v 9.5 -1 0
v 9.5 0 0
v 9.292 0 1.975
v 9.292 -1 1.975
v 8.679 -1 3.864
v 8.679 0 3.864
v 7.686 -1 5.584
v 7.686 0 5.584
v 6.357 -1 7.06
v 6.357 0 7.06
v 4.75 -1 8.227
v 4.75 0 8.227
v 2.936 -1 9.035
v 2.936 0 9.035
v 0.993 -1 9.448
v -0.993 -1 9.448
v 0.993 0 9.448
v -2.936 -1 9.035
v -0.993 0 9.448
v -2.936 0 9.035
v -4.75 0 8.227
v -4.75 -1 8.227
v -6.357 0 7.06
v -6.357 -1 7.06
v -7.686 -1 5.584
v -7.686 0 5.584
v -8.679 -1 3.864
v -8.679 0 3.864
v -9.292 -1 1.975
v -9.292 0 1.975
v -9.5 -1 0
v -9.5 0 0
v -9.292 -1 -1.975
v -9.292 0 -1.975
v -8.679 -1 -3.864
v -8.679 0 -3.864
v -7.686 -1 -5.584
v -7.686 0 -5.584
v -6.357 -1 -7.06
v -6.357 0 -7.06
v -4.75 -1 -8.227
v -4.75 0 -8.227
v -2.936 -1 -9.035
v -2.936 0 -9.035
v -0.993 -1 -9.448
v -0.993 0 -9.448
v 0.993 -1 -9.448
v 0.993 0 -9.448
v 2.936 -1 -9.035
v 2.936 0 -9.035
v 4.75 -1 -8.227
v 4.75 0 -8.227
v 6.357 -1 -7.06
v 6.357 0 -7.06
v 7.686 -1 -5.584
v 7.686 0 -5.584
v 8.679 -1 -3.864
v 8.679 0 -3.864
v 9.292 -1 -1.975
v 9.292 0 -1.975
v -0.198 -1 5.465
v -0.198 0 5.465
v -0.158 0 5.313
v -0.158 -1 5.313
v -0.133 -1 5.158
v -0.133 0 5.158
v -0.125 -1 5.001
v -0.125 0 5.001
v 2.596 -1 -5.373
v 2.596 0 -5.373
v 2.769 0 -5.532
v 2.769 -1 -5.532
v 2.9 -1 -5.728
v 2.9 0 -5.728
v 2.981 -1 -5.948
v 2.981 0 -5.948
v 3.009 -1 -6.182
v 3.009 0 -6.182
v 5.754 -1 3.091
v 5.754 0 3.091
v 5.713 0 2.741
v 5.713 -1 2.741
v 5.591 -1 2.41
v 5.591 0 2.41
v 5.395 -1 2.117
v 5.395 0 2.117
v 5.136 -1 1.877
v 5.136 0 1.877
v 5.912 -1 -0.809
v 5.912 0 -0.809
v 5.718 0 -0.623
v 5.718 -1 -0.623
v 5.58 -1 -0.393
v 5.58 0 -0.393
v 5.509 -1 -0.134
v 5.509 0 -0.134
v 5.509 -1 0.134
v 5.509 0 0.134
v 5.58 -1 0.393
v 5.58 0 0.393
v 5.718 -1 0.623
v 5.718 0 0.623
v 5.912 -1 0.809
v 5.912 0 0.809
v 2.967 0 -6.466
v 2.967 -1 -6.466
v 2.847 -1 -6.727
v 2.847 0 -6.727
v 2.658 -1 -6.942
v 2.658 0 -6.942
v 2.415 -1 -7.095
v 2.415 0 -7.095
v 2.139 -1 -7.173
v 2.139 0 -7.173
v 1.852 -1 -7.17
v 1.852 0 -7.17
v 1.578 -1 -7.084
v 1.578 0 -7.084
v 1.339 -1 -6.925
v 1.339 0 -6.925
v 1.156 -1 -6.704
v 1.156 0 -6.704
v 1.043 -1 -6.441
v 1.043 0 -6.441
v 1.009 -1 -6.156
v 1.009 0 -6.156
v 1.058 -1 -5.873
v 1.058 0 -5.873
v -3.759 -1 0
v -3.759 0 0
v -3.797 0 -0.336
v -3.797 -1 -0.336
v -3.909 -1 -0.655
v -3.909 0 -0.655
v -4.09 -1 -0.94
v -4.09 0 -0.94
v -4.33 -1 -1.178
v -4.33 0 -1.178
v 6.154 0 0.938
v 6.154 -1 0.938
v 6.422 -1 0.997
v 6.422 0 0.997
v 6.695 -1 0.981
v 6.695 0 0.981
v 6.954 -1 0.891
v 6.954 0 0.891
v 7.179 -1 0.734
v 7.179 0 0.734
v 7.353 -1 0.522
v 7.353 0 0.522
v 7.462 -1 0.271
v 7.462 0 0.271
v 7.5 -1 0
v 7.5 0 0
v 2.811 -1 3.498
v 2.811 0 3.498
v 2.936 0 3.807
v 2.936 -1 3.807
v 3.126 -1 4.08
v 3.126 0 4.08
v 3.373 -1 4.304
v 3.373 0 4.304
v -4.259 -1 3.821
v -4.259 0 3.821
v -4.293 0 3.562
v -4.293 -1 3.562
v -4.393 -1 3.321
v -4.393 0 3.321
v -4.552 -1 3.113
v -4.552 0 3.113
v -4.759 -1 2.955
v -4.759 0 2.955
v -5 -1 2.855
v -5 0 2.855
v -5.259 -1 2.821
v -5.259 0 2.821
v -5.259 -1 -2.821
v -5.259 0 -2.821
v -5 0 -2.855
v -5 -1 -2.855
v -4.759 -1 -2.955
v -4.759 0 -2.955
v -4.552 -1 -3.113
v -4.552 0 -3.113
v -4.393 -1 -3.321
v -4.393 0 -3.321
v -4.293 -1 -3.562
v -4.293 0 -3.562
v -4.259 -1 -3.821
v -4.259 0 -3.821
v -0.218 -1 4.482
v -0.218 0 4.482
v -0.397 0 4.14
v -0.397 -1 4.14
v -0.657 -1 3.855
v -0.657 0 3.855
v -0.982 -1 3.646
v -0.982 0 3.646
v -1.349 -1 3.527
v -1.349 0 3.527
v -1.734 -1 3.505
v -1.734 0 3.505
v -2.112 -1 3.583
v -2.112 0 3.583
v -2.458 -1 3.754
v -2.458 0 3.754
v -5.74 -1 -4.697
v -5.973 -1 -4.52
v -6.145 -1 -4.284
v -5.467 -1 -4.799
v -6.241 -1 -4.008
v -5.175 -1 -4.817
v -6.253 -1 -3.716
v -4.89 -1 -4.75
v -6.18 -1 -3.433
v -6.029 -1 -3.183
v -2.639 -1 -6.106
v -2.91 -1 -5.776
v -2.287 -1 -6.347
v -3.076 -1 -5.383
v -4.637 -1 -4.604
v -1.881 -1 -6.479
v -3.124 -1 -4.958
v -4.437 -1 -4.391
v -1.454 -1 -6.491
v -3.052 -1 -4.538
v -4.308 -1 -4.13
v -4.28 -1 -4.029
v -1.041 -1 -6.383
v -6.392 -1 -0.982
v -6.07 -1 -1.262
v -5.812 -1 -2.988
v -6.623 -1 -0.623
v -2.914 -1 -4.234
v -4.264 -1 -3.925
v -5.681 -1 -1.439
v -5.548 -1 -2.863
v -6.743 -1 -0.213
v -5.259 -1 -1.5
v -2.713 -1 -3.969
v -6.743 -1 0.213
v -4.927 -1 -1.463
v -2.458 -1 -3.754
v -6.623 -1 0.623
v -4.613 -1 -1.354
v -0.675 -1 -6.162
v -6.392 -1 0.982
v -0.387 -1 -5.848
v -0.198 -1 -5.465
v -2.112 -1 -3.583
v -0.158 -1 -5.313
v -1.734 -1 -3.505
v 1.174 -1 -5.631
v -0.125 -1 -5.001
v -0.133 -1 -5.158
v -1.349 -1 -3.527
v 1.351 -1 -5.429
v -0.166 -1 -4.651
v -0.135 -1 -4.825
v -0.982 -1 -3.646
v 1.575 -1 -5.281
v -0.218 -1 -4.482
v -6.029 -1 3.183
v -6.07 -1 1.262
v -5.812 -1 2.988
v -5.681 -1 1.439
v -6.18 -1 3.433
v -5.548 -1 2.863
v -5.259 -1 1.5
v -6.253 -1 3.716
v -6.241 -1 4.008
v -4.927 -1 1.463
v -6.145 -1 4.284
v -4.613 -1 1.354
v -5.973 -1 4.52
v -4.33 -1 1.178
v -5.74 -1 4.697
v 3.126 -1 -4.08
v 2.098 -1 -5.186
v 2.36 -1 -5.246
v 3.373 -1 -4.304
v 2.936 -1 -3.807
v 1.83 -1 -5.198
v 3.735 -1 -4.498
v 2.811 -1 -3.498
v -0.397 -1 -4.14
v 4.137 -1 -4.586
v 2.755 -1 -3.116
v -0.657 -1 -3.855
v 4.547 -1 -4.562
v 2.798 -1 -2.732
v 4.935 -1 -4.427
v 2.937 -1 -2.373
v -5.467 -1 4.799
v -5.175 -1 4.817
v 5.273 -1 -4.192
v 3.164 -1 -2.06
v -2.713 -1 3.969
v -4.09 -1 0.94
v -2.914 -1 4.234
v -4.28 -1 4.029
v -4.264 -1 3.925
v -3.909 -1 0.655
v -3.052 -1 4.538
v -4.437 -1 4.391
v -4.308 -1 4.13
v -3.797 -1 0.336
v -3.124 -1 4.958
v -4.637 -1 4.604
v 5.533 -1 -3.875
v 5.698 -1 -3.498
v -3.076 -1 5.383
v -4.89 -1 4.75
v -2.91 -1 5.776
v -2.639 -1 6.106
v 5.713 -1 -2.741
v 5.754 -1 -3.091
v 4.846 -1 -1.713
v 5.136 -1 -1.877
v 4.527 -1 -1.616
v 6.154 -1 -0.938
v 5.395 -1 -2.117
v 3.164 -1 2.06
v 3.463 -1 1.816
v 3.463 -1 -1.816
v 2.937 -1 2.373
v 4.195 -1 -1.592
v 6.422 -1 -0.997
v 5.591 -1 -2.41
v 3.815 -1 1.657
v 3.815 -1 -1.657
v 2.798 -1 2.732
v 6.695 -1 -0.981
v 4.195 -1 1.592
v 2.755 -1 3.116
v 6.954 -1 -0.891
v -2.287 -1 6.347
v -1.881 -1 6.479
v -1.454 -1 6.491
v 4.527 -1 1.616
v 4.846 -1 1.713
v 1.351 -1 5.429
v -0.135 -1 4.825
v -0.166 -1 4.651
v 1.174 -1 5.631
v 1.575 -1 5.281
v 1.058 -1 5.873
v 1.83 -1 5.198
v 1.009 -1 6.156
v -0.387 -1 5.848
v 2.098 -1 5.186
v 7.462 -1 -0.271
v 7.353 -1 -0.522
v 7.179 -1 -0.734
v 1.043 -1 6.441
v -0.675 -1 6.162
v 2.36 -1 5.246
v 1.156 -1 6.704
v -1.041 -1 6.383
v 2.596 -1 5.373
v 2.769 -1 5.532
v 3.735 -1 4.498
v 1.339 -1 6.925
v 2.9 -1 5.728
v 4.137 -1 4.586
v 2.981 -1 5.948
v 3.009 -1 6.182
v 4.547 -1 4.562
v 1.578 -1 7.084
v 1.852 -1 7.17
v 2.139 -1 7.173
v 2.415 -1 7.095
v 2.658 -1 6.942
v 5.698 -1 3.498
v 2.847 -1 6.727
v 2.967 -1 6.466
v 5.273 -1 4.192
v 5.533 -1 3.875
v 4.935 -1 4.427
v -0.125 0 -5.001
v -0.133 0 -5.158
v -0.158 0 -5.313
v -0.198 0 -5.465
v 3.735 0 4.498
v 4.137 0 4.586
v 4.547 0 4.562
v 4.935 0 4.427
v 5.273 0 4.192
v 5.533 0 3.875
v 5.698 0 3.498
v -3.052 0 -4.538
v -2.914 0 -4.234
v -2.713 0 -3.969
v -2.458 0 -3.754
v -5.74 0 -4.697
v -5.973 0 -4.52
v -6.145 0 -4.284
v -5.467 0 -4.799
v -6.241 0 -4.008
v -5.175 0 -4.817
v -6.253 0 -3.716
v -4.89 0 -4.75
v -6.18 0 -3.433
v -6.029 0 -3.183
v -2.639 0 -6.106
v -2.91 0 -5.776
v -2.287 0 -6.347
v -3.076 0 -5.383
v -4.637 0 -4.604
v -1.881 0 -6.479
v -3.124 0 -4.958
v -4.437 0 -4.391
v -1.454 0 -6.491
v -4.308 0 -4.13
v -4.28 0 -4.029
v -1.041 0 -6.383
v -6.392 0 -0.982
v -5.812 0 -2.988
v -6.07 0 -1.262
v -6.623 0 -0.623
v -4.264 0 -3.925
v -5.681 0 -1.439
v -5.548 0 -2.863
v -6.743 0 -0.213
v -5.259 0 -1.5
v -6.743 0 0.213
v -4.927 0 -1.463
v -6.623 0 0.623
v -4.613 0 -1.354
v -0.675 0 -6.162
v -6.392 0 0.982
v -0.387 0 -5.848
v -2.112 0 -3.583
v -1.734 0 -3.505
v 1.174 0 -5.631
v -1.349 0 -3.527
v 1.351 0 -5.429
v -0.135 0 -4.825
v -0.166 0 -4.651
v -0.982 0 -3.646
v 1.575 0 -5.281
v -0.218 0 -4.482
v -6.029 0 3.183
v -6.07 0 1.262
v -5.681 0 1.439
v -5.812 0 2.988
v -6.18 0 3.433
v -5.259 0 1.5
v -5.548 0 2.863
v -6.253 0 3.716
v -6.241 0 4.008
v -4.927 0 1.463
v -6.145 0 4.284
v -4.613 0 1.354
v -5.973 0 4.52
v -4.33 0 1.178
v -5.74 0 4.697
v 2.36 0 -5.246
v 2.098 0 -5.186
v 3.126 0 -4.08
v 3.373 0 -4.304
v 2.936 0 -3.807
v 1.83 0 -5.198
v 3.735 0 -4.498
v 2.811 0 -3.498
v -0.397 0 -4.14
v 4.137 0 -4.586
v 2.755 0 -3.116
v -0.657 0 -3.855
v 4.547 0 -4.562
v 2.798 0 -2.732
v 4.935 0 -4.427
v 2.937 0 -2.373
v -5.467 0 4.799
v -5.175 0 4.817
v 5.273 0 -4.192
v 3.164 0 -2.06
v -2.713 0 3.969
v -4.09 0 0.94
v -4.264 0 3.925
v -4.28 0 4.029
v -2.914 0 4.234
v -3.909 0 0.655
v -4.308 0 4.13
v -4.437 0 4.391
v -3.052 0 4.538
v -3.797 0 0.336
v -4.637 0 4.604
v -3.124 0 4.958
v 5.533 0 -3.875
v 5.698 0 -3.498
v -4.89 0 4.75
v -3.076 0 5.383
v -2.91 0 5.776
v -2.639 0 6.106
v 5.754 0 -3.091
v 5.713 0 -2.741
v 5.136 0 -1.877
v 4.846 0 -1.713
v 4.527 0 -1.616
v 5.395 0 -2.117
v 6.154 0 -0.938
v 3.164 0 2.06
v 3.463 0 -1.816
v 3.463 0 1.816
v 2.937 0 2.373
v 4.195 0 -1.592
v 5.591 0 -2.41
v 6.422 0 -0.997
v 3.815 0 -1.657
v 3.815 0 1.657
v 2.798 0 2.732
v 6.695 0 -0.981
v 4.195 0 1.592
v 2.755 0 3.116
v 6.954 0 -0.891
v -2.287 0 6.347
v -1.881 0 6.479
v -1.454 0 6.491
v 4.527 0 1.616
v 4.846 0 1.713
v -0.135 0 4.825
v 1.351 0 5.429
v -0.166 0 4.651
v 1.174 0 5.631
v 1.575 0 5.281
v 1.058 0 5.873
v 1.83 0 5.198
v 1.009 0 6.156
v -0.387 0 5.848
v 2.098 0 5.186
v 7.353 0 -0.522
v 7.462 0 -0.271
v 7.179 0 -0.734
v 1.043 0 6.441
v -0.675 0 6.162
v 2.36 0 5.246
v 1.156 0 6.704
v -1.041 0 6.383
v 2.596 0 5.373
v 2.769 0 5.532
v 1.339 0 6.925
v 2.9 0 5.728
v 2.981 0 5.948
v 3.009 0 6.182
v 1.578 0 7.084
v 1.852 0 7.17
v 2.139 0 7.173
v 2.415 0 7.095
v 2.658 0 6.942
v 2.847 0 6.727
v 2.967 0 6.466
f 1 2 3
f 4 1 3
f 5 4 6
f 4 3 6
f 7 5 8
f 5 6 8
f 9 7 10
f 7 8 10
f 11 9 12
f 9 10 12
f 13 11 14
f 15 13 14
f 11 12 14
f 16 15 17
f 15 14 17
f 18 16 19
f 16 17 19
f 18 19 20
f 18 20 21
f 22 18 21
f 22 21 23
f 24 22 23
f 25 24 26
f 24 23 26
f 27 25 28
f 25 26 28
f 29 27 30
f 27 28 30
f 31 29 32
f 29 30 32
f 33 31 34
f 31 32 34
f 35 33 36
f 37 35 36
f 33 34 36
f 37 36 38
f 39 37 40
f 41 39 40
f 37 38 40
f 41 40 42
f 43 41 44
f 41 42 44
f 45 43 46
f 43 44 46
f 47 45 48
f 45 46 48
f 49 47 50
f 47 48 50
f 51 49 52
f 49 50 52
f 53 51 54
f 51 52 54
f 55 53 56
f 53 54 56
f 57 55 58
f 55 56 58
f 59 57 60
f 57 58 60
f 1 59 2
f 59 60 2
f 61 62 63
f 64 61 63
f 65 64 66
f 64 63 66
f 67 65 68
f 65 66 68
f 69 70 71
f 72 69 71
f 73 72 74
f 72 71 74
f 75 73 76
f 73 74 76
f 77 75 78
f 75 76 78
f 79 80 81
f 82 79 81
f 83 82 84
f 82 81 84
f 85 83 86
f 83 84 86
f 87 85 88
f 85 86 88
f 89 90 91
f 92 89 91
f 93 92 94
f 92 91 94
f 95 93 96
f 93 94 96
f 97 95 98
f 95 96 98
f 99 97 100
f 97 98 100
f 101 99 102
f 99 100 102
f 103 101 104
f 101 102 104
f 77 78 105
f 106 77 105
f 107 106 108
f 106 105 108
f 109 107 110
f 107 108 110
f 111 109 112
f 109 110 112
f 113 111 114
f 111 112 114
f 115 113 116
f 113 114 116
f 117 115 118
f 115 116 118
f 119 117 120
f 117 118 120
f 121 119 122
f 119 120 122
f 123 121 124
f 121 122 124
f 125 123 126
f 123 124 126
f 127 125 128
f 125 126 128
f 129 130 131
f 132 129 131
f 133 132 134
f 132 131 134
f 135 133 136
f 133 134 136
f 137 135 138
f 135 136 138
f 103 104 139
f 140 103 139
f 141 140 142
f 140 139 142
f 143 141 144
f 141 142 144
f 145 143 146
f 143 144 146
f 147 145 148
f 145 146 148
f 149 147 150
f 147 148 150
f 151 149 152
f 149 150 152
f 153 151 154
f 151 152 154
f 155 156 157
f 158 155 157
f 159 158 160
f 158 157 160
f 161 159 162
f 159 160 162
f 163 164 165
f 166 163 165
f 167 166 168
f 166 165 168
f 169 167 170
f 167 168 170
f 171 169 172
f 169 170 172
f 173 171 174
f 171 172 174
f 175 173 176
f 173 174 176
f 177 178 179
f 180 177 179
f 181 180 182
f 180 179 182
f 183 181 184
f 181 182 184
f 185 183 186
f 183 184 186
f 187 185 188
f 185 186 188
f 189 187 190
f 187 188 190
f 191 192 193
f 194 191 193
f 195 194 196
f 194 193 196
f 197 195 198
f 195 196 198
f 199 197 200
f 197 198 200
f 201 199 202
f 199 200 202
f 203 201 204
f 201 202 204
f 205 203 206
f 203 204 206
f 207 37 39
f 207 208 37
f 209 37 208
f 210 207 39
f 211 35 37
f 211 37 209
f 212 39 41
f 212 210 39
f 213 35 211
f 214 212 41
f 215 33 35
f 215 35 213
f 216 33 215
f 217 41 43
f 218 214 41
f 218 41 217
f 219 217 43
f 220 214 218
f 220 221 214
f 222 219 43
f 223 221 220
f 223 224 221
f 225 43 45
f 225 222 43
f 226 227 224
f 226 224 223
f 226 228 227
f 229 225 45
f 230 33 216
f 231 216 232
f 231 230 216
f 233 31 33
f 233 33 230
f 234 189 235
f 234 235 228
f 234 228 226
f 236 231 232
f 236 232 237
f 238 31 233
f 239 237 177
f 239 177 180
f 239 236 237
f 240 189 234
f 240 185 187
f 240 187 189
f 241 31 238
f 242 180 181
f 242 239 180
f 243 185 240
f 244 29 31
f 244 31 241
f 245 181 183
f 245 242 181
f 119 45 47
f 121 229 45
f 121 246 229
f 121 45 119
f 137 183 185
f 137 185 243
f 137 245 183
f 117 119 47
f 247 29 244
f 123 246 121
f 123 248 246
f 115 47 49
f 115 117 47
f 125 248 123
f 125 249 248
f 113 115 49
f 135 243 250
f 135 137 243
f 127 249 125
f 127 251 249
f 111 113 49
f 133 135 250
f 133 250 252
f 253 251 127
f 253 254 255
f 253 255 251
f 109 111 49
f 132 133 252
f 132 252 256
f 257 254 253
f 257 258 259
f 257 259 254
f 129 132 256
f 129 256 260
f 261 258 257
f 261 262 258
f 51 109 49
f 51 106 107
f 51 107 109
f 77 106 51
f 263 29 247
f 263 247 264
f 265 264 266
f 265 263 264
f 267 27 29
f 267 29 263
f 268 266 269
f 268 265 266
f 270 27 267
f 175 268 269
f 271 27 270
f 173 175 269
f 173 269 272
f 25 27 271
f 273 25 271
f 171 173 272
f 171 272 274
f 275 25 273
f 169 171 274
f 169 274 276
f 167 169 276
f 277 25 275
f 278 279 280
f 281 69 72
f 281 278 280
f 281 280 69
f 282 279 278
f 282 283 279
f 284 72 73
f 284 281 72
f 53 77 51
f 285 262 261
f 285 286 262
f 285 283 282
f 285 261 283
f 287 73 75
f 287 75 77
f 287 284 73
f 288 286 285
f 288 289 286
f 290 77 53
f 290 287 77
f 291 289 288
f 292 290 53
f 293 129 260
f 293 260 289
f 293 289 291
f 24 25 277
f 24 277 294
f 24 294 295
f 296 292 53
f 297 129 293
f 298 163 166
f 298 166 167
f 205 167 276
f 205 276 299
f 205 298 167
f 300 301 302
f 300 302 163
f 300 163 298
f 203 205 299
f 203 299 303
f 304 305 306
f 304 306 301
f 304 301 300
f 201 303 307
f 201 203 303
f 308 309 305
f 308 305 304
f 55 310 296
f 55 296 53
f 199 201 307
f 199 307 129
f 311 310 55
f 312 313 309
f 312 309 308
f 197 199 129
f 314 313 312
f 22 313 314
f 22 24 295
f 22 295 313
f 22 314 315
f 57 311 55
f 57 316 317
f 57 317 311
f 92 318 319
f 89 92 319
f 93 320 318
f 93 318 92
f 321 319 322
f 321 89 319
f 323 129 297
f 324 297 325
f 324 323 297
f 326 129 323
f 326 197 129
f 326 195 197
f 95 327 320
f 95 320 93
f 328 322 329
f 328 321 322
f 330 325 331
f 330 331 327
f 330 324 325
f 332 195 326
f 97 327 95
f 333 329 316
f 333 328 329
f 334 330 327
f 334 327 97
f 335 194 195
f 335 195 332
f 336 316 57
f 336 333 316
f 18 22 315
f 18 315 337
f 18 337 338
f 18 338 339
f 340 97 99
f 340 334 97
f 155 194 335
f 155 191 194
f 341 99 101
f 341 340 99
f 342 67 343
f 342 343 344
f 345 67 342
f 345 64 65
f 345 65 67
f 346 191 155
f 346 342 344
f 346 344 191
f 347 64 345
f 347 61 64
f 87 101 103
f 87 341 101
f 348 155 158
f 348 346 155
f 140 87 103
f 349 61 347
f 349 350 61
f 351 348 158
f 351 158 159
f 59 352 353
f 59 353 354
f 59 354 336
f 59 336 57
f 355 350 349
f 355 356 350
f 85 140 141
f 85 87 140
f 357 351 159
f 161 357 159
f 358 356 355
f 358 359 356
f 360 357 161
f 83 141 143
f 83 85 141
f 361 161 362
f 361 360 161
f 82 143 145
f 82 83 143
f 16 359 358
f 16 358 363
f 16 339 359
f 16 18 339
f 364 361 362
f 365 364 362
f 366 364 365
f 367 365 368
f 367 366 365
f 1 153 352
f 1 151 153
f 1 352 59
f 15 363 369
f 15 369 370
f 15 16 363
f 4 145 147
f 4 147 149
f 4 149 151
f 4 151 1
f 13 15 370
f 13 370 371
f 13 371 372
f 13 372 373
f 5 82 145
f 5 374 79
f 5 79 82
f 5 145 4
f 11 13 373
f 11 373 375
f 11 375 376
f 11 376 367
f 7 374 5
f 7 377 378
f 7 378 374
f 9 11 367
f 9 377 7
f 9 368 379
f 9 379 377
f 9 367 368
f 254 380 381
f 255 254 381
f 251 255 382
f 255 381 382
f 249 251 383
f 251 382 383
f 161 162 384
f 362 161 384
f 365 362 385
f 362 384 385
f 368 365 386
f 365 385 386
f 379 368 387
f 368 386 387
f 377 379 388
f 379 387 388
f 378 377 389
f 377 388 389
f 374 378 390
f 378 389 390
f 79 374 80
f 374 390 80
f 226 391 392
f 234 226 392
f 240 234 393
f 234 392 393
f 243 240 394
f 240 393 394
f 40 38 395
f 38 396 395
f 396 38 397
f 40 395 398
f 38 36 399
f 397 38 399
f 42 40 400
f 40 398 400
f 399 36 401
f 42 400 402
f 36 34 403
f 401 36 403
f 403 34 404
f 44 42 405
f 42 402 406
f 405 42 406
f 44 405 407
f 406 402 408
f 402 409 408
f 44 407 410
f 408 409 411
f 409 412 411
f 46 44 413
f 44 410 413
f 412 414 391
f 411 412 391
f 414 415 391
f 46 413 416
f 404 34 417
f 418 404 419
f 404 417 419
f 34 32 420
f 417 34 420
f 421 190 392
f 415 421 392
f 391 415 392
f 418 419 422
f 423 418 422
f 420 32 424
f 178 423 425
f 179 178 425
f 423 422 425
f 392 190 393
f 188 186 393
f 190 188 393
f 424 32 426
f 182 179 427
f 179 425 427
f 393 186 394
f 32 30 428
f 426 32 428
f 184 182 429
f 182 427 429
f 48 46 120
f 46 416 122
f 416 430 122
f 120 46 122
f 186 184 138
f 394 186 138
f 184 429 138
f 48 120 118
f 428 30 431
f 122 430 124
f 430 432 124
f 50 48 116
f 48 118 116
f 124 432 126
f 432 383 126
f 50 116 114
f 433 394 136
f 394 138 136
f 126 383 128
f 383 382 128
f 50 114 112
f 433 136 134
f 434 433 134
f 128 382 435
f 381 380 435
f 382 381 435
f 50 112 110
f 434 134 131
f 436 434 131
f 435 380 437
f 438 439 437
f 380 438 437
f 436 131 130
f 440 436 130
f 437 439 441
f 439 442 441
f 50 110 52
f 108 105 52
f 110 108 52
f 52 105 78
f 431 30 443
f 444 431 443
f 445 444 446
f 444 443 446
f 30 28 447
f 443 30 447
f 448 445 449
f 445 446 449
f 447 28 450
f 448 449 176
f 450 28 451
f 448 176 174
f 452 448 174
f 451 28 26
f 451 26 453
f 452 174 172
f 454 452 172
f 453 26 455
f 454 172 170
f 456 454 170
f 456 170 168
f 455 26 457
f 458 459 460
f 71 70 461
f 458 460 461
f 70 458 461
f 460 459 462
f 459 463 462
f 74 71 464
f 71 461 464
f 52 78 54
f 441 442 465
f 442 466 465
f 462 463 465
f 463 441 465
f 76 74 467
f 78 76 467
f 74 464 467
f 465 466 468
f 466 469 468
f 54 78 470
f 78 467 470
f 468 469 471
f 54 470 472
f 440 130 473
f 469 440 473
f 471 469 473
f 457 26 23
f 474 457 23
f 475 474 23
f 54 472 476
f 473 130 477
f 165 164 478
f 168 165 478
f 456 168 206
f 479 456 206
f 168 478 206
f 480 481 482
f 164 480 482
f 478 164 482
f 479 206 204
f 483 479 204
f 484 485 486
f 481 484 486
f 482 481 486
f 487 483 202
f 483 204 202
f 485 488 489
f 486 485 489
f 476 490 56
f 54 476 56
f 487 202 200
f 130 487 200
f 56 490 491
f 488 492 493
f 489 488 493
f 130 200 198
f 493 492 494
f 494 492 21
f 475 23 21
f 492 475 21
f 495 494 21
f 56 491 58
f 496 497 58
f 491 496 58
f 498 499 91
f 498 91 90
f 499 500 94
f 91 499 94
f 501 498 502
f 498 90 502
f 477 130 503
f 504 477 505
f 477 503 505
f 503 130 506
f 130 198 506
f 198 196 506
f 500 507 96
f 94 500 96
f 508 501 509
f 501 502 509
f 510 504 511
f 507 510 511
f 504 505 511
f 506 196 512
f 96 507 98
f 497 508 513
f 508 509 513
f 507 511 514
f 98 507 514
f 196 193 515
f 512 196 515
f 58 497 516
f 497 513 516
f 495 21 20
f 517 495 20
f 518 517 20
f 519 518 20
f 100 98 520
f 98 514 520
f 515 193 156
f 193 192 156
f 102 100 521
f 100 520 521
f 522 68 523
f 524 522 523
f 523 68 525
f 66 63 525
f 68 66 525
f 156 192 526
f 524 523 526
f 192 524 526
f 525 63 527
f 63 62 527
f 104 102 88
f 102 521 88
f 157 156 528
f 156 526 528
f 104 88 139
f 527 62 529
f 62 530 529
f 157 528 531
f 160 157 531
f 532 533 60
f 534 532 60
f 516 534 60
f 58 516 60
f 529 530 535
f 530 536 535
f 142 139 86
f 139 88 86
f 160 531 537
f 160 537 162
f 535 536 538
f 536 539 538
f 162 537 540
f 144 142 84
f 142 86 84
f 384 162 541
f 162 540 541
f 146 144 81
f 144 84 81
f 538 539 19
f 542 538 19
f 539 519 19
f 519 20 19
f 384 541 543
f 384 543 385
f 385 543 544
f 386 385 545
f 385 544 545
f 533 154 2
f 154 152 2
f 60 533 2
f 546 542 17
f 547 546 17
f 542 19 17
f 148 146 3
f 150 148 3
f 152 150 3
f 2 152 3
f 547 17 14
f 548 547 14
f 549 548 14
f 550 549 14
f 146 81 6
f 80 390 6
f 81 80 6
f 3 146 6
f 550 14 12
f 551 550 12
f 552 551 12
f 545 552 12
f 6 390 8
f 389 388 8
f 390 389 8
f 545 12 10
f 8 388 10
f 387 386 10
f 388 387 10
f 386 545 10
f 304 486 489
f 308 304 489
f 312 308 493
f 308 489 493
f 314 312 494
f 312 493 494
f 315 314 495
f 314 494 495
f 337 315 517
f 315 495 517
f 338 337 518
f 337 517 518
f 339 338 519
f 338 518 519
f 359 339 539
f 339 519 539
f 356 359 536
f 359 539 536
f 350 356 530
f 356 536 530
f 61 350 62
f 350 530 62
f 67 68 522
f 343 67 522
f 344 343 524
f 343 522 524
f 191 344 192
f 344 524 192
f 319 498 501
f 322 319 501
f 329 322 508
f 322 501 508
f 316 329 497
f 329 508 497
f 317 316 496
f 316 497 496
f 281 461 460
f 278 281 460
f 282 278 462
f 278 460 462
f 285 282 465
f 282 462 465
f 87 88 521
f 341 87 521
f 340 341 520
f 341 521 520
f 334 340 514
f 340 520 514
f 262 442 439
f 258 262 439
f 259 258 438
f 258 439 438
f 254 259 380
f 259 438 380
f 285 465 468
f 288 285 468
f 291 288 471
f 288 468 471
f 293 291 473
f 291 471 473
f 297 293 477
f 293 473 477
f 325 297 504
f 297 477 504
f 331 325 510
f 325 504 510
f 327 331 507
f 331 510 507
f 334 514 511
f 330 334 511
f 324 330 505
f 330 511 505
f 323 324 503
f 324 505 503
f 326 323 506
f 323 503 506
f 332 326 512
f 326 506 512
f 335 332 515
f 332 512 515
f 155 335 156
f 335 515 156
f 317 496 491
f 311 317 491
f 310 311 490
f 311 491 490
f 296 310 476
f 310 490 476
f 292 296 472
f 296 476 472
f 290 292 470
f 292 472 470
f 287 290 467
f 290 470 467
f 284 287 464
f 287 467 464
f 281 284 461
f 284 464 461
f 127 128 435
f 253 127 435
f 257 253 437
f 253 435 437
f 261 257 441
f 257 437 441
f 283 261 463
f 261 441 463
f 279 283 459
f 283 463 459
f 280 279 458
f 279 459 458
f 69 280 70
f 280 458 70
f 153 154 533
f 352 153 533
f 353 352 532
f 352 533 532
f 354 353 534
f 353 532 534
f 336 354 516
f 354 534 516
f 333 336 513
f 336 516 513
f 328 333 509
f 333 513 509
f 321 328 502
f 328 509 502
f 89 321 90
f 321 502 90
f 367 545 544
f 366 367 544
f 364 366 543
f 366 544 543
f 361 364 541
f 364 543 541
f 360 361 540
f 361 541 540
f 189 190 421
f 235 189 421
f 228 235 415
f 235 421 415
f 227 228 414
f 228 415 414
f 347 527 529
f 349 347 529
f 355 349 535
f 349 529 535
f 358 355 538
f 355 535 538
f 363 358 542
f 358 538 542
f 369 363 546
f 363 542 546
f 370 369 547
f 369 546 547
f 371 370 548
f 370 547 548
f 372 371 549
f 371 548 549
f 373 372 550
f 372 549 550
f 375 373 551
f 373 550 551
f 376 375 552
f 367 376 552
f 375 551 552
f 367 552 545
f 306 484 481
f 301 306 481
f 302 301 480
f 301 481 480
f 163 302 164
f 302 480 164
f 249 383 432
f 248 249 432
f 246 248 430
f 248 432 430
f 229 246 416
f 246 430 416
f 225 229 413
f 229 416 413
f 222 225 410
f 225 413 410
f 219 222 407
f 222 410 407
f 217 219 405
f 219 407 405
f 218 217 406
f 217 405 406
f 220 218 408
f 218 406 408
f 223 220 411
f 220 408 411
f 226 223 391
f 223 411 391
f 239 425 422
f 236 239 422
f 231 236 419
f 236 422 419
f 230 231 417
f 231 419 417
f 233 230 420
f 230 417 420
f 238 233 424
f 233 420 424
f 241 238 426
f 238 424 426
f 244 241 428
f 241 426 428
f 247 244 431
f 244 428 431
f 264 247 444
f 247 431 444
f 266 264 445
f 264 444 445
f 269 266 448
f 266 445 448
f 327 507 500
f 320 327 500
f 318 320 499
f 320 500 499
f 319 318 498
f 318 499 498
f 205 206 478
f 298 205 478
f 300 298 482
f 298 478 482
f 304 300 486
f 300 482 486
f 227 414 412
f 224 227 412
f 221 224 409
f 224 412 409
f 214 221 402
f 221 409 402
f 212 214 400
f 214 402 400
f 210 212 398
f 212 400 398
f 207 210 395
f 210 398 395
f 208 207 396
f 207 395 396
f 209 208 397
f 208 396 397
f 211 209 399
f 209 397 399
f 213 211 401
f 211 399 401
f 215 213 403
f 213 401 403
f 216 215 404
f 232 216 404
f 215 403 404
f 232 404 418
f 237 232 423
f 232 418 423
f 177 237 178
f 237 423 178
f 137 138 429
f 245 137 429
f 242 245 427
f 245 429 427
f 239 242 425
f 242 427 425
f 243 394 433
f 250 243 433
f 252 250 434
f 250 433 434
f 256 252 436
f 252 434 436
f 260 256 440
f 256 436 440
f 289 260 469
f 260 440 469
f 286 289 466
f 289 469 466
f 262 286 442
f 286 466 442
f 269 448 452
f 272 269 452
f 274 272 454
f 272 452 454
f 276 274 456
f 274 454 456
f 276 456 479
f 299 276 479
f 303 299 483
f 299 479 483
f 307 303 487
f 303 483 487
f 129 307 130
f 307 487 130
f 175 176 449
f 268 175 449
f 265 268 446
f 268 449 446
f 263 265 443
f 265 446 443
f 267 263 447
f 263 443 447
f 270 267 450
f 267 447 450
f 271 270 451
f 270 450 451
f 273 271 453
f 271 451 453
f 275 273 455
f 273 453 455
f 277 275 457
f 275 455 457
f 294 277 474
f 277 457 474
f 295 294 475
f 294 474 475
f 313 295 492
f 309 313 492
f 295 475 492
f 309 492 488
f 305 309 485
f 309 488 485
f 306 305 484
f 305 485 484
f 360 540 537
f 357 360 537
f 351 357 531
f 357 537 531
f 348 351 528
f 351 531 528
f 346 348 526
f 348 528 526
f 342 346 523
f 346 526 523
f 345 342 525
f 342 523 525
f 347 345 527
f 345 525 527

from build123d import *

# Parameters (mm, degrees)
F0_R     = 9.5
F1_DEPTH = 1


# Not quite as in the source:
# - a feature names something its author has since deleted; it is built from what else it names


with BuildPart() as f1:
    # F0 (on Front) → F1 (new body)
    with BuildSketch(Plane.XZ):
        Circle(F0_R)
        with BuildLine():
            Line((-6.1874431518, -2.6427799437), (-5.2586104634, -1.91030207))
            Line((-5.2586104634, -1.91030207), (-5.2586104634, -1.5))
            ThreePointArc((-5.2586104634, -1.5), (-6.7586104634, 0), (-5.2586104634, 1.5))
            Line((-5.2586104634, 1.5), (-5.2586104634, 1.91030207))
            Line((-5.2586104634, 1.91030207), (-6.1874431518, 2.6427799437))
            ThreePointArc((-6.1874431518, 2.6427799437), (-6.472135955, 4.7022820183), (-4.4254581722, 5.0679442137))
            Line((-4.4254581722, 5.0679442137), (-3.4418052317, 4.4109199439))
            Line((-3.4418052317, 4.4109199439), (-3.0515847744, 4.5377102563))
            ThreePointArc((-3.0515847744, 4.5377102563), (-2.0885254916, 6.4278205224), (-0.1984152256, 5.4647612395))
            Line((-0.1984152256, 5.4647612395), (0.1918052317, 5.5915515519))
            Line((0.1918052317, 5.5915515519), (0.601408001, 6.7012720437))
            ThreePointArc((0.601408001, 6.7012720437), (2.2724250824, 7.6584857382), (3.5086104634, 6.1818673559))
            ThreePointArc((3.5086104634, 6.1818673559), (3.4944811986, 5.976469794), (3.4523595855, 5.7749417209))
            Line((3.4523595855, 5.7749417209), (3.1314578476, 4.6364005169))
            Line((3.1314578476, 4.6364005169), (3.3726273533, 4.3044591695))
            ThreePointArc((3.3726273533, 4.3044591695), (4.9352909813, 4.4274434642), (5.7543052317, 3.090933678))
            ThreePointArc((5.7543052317, 3.090933678), (5.590815018, 2.4099479283), (5.1359831102, 1.8774081864))
            Line((5.1359831102, 1.8774081864), (5.3771526159, 1.545466839))
            Line((5.3771526159, 1.545466839), (6.5591337375, 1.4988339471))
            ThreePointArc((6.5591337375, 1.4988339471), (7.5813650184, 1.0395430231), (8, 0))
            ThreePointArc((8, 0), (7.5813650184, -1.0395430231), (6.5591337375, -1.4988339471))
            Line((6.5591337375, -1.4988339471), (5.3771526159, -1.545466839))
            Line((5.3771526159, -1.545466839), (5.1359831102, -1.8774081864))
            ThreePointArc((5.1359831102, -1.8774081864), (5.590815018, -2.4099479283), (5.7543052317, -3.090933678))
            ThreePointArc((5.7543052317, -3.090933678), (4.9352909813, -4.4274434642), (3.3726273533, -4.3044591695))
            Line((3.3726273533, -4.3044591695), (3.1314578476, -4.6364005169))
            Line((3.1314578476, -4.6364005169), (3.4523595855, -5.7749417209))
            ThreePointArc((3.4523595855, -5.7749417209), (3.4944811986, -5.976469794), (3.5086104634, -6.1818673559))
            ThreePointArc((3.5086104634, -6.1818673559), (2.2724250824, -7.6584857382), (0.601408001, -6.7012720437))
            Line((0.601408001, -6.7012720437), (0.1918052317, -5.5915515519))
            Line((0.1918052317, -5.5915515519), (-0.1984152256, -5.4647612395))
            ThreePointArc((-0.1984152256, -5.4647612395), (-2.0885254916, -6.4278205224), (-3.0515847744, -4.5377102563))
            Line((-3.0515847744, -4.5377102563), (-3.4418052317, -4.4109199439))
            Line((-3.4418052317, -4.4109199439), (-4.4254581722, -5.0679442137))
            ThreePointArc((-4.4254581722, -5.0679442137), (-6.472135955, -4.7022820183), (-6.1874431518, -2.6427799437))
        make_face(mode=Mode.SUBTRACT)
        with BuildLine():
            Line((-5.2586104634, -1.91030207), (-5.2586104634, -2.3206041399))
            ThreePointArc((-5.2586104634, -2.3206041399), (-4.1979502917, -2.7599439681), (-3.7586104634, -3.8206041399))
            ThreePointArc((-3.7586104634, -3.8206041399), (-3.7770779525, -4.0552558375), (-3.832025689, -4.2841296315))
            Line((-3.832025689, -4.2841296315), (-3.4418052317, -4.4109199439))
            Line((-3.4418052317, -4.4109199439), (-2.4581522912, -3.7538956741))
            ThreePointArc((-2.4581522912, -3.7538956741), (-1.1614745084, -3.5746509735), (-0.2177975376, -4.4818310601))
            Line((-0.2177975376, -4.4818310601), (0.1918052317, -5.5915515519))
            Line((0.1918052317, -5.5915515519), (0.582025689, -5.7183418644))
            ThreePointArc((0.582025689, -5.7183418644), (1.5450849719, -4.7552825815), (2.8902883419, -4.9683418644))
            Line((2.8902883419, -4.9683418644), (3.1314578476, -4.6364005169))
            Line((3.1314578476, -4.6364005169), (2.8105561096, -3.497859313))
            ThreePointArc((2.8105561096, -3.497859313), (3.0407797402, -2.2092557995), (4.1951714942, -1.5920997308))
            Line((4.1951714942, -1.5920997308), (5.3771526159, -1.545466839))
            Line((5.3771526159, -1.545466839), (5.6183221216, -1.2135254916))
            ThreePointArc((5.6183221216, -1.2135254916), (5, 0), (5.6183221216, 1.2135254916))
            Line((5.6183221216, 1.2135254916), (5.3771526159, 1.545466839))
            Line((5.3771526159, 1.545466839), (4.1951714942, 1.5920997308))
            ThreePointArc((4.1951714942, 1.5920997308), (3.0407797402, 2.2092557995), (2.8105561096, 3.497859313))
            Line((2.8105561096, 3.497859313), (3.1314578476, 4.6364005169))
            Line((3.1314578476, 4.6364005169), (2.8902883419, 4.9683418644))
            ThreePointArc((2.8902883419, 4.9683418644), (1.5450849719, 4.7552825815), (0.582025689, 5.7183418644))
            Line((0.582025689, 5.7183418644), (0.1918052317, 5.5915515519))
            Line((0.1918052317, 5.5915515519), (-0.2177975376, 4.4818310601))
            ThreePointArc((-0.2177975376, 4.4818310601), (-1.1614745084, 3.5746509735), (-2.4581522912, 3.7538956741))
            Line((-2.4581522912, 3.7538956741), (-3.4418052317, 4.4109199439))
            Line((-3.4418052317, 4.4109199439), (-3.832025689, 4.2841296315))
            ThreePointArc((-3.832025689, 4.2841296315), (-3.7770779525, 4.0552558375), (-3.7586104634, 3.8206041399))
            ThreePointArc((-3.7586104634, 3.8206041399), (-4.1979502917, 2.7599439681), (-5.2586104634, 2.3206041399))
            Line((-5.2586104634, 2.3206041399), (-5.2586104634, 1.91030207))
            Line((-5.2586104634, 1.91030207), (-4.3297777751, 1.1778241962))
            ThreePointArc((-4.3297777751, 1.1778241962), (-3.9089347556, 0.6545039983), (-3.7586104634, 0))
            ThreePointArc((-3.7586104634, 0), (-3.9089347556, -0.6545039983), (-4.3297777751, -1.1778241962))
            Line((-4.3297777751, -1.1778241962), (-5.2586104634, -1.91030207))
        make_face()
        with BuildLine():
            ThreePointArc((1.5, 2), (2.2360679775, 1.1180339887), (2.5, 0))
            ThreePointArc((2.5, 0), (2.2360679775, -1.1180339887), (1.5, -2))
            ThreePointArc((1.5, -2), (-2.5, 0), (1.5, 2))
        make_face(mode=Mode.SUBTRACT)
        with BuildLine():
            Line((1.5, -2), (1.5, 2))
            ThreePointArc((1.5, 2), (-2.5, 0), (1.5, -2))
        make_face()
        with BuildLine():
            ThreePointArc((1.5, -2), (2.2360679775, -1.1180339887), (2.5, 0))
            ThreePointArc((2.5, 0), (2.2360679775, 1.1180339887), (1.5, 2))
            Line((1.5, 2), (1.5, -2))
        make_face()
        with BuildLine():
            ThreePointArc((-4.3075539471, -4.1296211343), (-6.0676274578, -4.4083893922), (-5.2586104634, -2.8206041399))
            Line((-5.2586104634, -2.8206041399), (-5.2586104634, -2.3206041399))
            ThreePointArc((-5.2586104634, -2.3206041399), (-5.7501710933, -2.403435079), (-6.1874431518, -2.6427799437))
            ThreePointArc((-6.1874431518, -2.6427799437), (-6.472135955, -4.7022820183), (-4.4254581722, -5.0679442137))
            ThreePointArc((-4.4254581722, -5.0679442137), (-4.0627031818, -4.7260354038), (-3.832025689, -4.2841296315))
            Line((-3.832025689, -4.2841296315), (-4.3075539471, -4.1296211343))
        make_face()
        with BuildLine():
            ThreePointArc((-6.1874431518, 2.6427799437), (-5.7501710933, 2.403435079), (-5.2586104634, 2.3206041399))
            Line((-5.2586104634, 2.3206041399), (-5.2586104634, 2.8206041399))
            ThreePointArc((-5.2586104634, 2.8206041399), (-6.0676274578, 4.4083893922), (-4.3075539471, 4.1296211343))
            Line((-4.3075539471, 4.1296211343), (-3.832025689, 4.2841296315))
            ThreePointArc((-3.832025689, 4.2841296315), (-4.0627031818, 4.7260354038), (-4.4254581722, 5.0679442137))
            ThreePointArc((-4.4254581722, 5.0679442137), (-6.472135955, 4.7022820183), (-6.1874431518, 2.6427799437))
        make_face()
        with BuildLine():
            Line((1.0575539471, -5.8728503615), (0.582025689, -5.7183418644))
            ThreePointArc((0.582025689, -5.7183418644), (0.508902005, -6.2114399724), (0.601408001, -6.7012720437))
            ThreePointArc((0.601408001, -6.7012720437), (2.2724250824, -7.6584857382), (3.5086104634, -6.1818673559))
            ThreePointArc((3.5086104634, -6.1818673559), (3.4944811986, -5.976469794), (3.4523595855, -5.7749417209))
            ThreePointArc((3.4523595855, -5.7749417209), (3.2392824408, -5.3242855906), (2.8902883419, -4.9683418644))
            Line((2.8902883419, -4.9683418644), (2.5963957157, -5.3728503615))
            ThreePointArc((2.5963957157, -5.3728503615), (2.8996169876, -5.7278768562), (3.0086104634, -6.1818673559))
            ThreePointArc((3.0086104634, -6.1818673559), (1.8521759984, -7.1695556965), (1.0575539471, -5.8728503615))
        make_face()
        with BuildLine():
            ThreePointArc((0.601408001, 6.7012720437), (0.508902005, 6.2114399724), (0.582025689, 5.7183418644))
            Line((0.582025689, 5.7183418644), (1.0575539471, 5.8728503615))
            ThreePointArc((1.0575539471, 5.8728503615), (1.8521759984, 7.1695556965), (3.0086104634, 6.1818673559))
            ThreePointArc((3.0086104634, 6.1818673559), (2.8996169876, 5.7278768562), (2.5963957157, 5.3728503615))
            Line((2.5963957157, 5.3728503615), (2.8902883419, 4.9683418644))
            ThreePointArc((2.8902883419, 4.9683418644), (3.2392824408, 5.3242855906), (3.4523595855, 5.7749417209))
            ThreePointArc((3.4523595855, 5.7749417209), (3.4944811986, 5.976469794), (3.5086104634, 6.1818673559))
            ThreePointArc((3.5086104634, 6.1818673559), (2.2724250824, 7.6584857382), (0.601408001, 6.7012720437))
        make_face()
        with BuildLine():
            Line((5.9122147477, -0.8090169944), (5.6183221216, -1.2135254916))
            ThreePointArc((5.6183221216, -1.2135254916), (6.0646898294, -1.435445943), (6.5591337375, -1.4988339471))
            ThreePointArc((6.5591337375, -1.4988339471), (7.5813650184, -1.0395430231), (8, 0))
            ThreePointArc((8, 0), (7.5813650184, 1.0395430231), (6.5591337375, 1.4988339471))
            ThreePointArc((6.5591337375, 1.4988339471), (6.0646898294, 1.435445943), (5.6183221216, 1.2135254916))
            Line((5.6183221216, 1.2135254916), (5.9122147477, 0.8090169944))
            ThreePointArc((5.9122147477, 0.8090169944), (6.9539904997, 0.8910065242), (7.5, 0))
            ThreePointArc((7.5, 0), (6.9539904997, -0.8910065242), (5.9122147477, -0.8090169944))
        make_face()
        with BuildLine():
            Line((-5.2586104634, -2.3206041399), (-5.2586104634, -2.8206041399))
            ThreePointArc((-5.2586104634, -2.8206041399), (-4.5515036823, -3.1134973587), (-4.2586104634, -3.8206041399))
            ThreePointArc((-4.2586104634, -3.8206041399), (-4.2709221228, -3.9770386049), (-4.3075539471, -4.1296211343))
            Line((-4.3075539471, -4.1296211343), (-3.832025689, -4.2841296315))
            ThreePointArc((-3.832025689, -4.2841296315), (-3.7770779525, -4.0552558375), (-3.7586104634, -3.8206041399))
            ThreePointArc((-3.7586104634, -3.8206041399), (-4.1979502917, -2.7599439681), (-5.2586104634, -2.3206041399))
        make_face()
        with BuildLine():
            Line((-5.2586104634, 2.8206041399), (-5.2586104634, 2.3206041399))
            ThreePointArc((-5.2586104634, 2.3206041399), (-4.1979502917, 2.7599439681), (-3.7586104634, 3.8206041399))
            ThreePointArc((-3.7586104634, 3.8206041399), (-3.7770779525, 4.0552558375), (-3.832025689, 4.2841296315))
            Line((-3.832025689, 4.2841296315), (-4.3075539471, 4.1296211343))
            ThreePointArc((-4.3075539471, 4.1296211343), (-4.2709221228, 3.9770386049), (-4.2586104634, 3.8206041399))
            ThreePointArc((-4.2586104634, 3.8206041399), (-4.5515036823, 3.1134973587), (-5.2586104634, 2.8206041399))
        make_face()
        with BuildLine():
            ThreePointArc((2.8902883419, -4.9683418644), (1.5450849719, -4.7552825815), (0.582025689, -5.7183418644))
            Line((0.582025689, -5.7183418644), (1.0575539471, -5.8728503615))
            ThreePointArc((1.0575539471, -5.8728503615), (1.6995934691, -5.2308108396), (2.5963957157, -5.3728503615))
            Line((2.5963957157, -5.3728503615), (2.8902883419, -4.9683418644))
        make_face()
        with BuildLine():
            Line((1.0575539471, 5.8728503615), (0.582025689, 5.7183418644))
            ThreePointArc((0.582025689, 5.7183418644), (1.5450849719, 4.7552825815), (2.8902883419, 4.9683418644))
            Line((2.8902883419, 4.9683418644), (2.5963957157, 5.3728503615))
            ThreePointArc((2.5963957157, 5.3728503615), (1.6995934691, 5.2308108396), (1.0575539471, 5.8728503615))
        make_face()
        with BuildLine():
            ThreePointArc((5.6183221216, 1.2135254916), (5, 0), (5.6183221216, -1.2135254916))
            Line((5.6183221216, -1.2135254916), (5.9122147477, -0.8090169944))
            ThreePointArc((5.9122147477, -0.8090169944), (5.5, 0), (5.9122147477, 0.8090169944))
            Line((5.9122147477, 0.8090169944), (5.6183221216, 1.2135254916))
        make_face()
        with BuildLine():
            ThreePointArc((-6.1874431518, -2.6427799437), (-5.7501710933, -2.403435079), (-5.2586104634, -2.3206041399))
            Line((-5.2586104634, -2.3206041399), (-5.2586104634, -1.91030207))
            Line((-5.2586104634, -1.91030207), (-6.1874431518, -2.6427799437))
        make_face()
        with BuildLine():
            Line((-3.4418052317, -4.4109199439), (-3.832025689, -4.2841296315))
            ThreePointArc((-3.832025689, -4.2841296315), (-4.0627031818, -4.7260354038), (-4.4254581722, -5.0679442137))
            Line((-4.4254581722, -5.0679442137), (-3.4418052317, -4.4109199439))
        make_face()
        with BuildLine():
            Line((-5.2586104634, -1.5), (-5.2586104634, -1.91030207))
            Line((-5.2586104634, -1.91030207), (-4.3297777751, -1.1778241962))
            ThreePointArc((-4.3297777751, -1.1778241962), (-4.7670498335, -1.4171690609), (-5.2586104634, -1.5))
        make_face()
        with BuildLine():
            Line((-2.4581522912, -3.7538956741), (-3.4418052317, -4.4109199439))
            Line((-3.4418052317, -4.4109199439), (-3.0515847744, -4.5377102563))
            ThreePointArc((-3.0515847744, -4.5377102563), (-2.8209072816, -4.095804484), (-2.4581522912, -3.7538956741))
        make_face()
        with BuildLine():
            Line((-5.2586104634, 1.91030207), (-5.2586104634, 1.5))
            ThreePointArc((-5.2586104634, 1.5), (-4.7670498335, 1.4171690609), (-4.3297777751, 1.1778241962))
            Line((-4.3297777751, 1.1778241962), (-5.2586104634, 1.91030207))
        make_face()
        with BuildLine():
            ThreePointArc((-0.125, -5.0012357479), (-0.1434674891, -5.2358874455), (-0.1984152256, -5.4647612395))
            Line((-0.1984152256, -5.4647612395), (0.1918052317, -5.5915515519))
            Line((0.1918052317, -5.5915515519), (-0.2177975376, -4.4818310601))
            ThreePointArc((-0.2177975376, -4.4818310601), (-0.1483816177, -4.737421129), (-0.125, -5.0012357479))
        make_face()
        with BuildLine():
            Line((-6.1874431518, 2.6427799437), (-5.2586104634, 1.91030207))
            Line((-5.2586104634, 1.91030207), (-5.2586104634, 2.3206041399))
            ThreePointArc((-5.2586104634, 2.3206041399), (-5.7501710933, 2.403435079), (-6.1874431518, 2.6427799437))
        make_face()
        with BuildLine():
            Line((0.582025689, -5.7183418644), (0.1918052317, -5.5915515519))
            Line((0.1918052317, -5.5915515519), (0.601408001, -6.7012720437))
            ThreePointArc((0.601408001, -6.7012720437), (0.508902005, -6.2114399724), (0.582025689, -5.7183418644))
        make_face()
        with BuildLine():
            Line((-3.4418052317, 4.4109199439), (-4.4254581722, 5.0679442137))
            ThreePointArc((-4.4254581722, 5.0679442137), (-4.0627031818, 4.7260354038), (-3.832025689, 4.2841296315))
            Line((-3.832025689, 4.2841296315), (-3.4418052317, 4.4109199439))
        make_face()
        with BuildLine():
            Line((3.1314578476, -4.6364005169), (2.8902883419, -4.9683418644))
            ThreePointArc((2.8902883419, -4.9683418644), (3.2392824408, -5.3242855906), (3.4523595855, -5.7749417209))
            Line((3.4523595855, -5.7749417209), (3.1314578476, -4.6364005169))
        make_face()
        with BuildLine():
            Line((-3.0515847744, 4.5377102563), (-3.4418052317, 4.4109199439))
            Line((-3.4418052317, 4.4109199439), (-2.4581522912, 3.7538956741))
            ThreePointArc((-2.4581522912, 3.7538956741), (-2.8209072816, 4.095804484), (-3.0515847744, 4.5377102563))
        make_face()
        with BuildLine():
            Line((2.8105561096, -3.497859313), (3.1314578476, -4.6364005169))
            Line((3.1314578476, -4.6364005169), (3.3726273533, -4.3044591695))
            ThreePointArc((3.3726273533, -4.3044591695), (3.0236332544, -3.9485154433), (2.8105561096, -3.497859313))
        make_face()
        with BuildLine():
            Line((0.1918052317, 5.5915515519), (-0.1984152256, 5.4647612395))
            ThreePointArc((-0.1984152256, 5.4647612395), (-0.1434674891, 5.2358874455), (-0.125, 5.0012357479))
            ThreePointArc((-0.125, 5.0012357479), (-0.1483816177, 4.737421129), (-0.2177975376, 4.4818310601))
            Line((-0.2177975376, 4.4818310601), (0.1918052317, 5.5915515519))
        make_face()
        with BuildLine():
            ThreePointArc((4.1951714942, -1.5920997308), (4.6896154024, -1.6554877349), (5.1359831102, -1.8774081864))
            Line((5.1359831102, -1.8774081864), (5.3771526159, -1.545466839))
            Line((5.3771526159, -1.545466839), (4.1951714942, -1.5920997308))
        make_face()
        with BuildLine():
            Line((0.601408001, 6.7012720437), (0.1918052317, 5.5915515519))
            Line((0.1918052317, 5.5915515519), (0.582025689, 5.7183418644))
            ThreePointArc((0.582025689, 5.7183418644), (0.508902005, 6.2114399724), (0.601408001, 6.7012720437))
        make_face()
        with BuildLine():
            Line((5.6183221216, -1.2135254916), (5.3771526159, -1.545466839))
            Line((5.3771526159, -1.545466839), (6.5591337375, -1.4988339471))
            ThreePointArc((6.5591337375, -1.4988339471), (6.0646898294, -1.435445943), (5.6183221216, -1.2135254916))
        make_face()
        with BuildLine():
            ThreePointArc((3.4523595855, 5.7749417209), (3.2392824408, 5.3242855906), (2.8902883419, 4.9683418644))
            Line((2.8902883419, 4.9683418644), (3.1314578476, 4.6364005169))
            Line((3.1314578476, 4.6364005169), (3.4523595855, 5.7749417209))
        make_face()
        with BuildLine():
            Line((5.3771526159, 1.545466839), (5.6183221216, 1.2135254916))
            ThreePointArc((5.6183221216, 1.2135254916), (6.0646898294, 1.435445943), (6.5591337375, 1.4988339471))
            Line((6.5591337375, 1.4988339471), (5.3771526159, 1.545466839))
        make_face()
        with BuildLine():
            Line((3.3726273533, 4.3044591695), (3.1314578476, 4.6364005169))
            Line((3.1314578476, 4.6364005169), (2.8105561096, 3.497859313))
            ThreePointArc((2.8105561096, 3.497859313), (3.0236332544, 3.9485154433), (3.3726273533, 4.3044591695))
        make_face()
        with BuildLine():
            Line((4.1951714942, 1.5920997308), (5.3771526159, 1.545466839))
            Line((5.3771526159, 1.545466839), (5.1359831102, 1.8774081864))
            ThreePointArc((5.1359831102, 1.8774081864), (4.6896154024, 1.6554877349), (4.1951714942, 1.5920997308))
        make_face()
    extrude(amount=F1_DEPTH)


solid = f1.part
